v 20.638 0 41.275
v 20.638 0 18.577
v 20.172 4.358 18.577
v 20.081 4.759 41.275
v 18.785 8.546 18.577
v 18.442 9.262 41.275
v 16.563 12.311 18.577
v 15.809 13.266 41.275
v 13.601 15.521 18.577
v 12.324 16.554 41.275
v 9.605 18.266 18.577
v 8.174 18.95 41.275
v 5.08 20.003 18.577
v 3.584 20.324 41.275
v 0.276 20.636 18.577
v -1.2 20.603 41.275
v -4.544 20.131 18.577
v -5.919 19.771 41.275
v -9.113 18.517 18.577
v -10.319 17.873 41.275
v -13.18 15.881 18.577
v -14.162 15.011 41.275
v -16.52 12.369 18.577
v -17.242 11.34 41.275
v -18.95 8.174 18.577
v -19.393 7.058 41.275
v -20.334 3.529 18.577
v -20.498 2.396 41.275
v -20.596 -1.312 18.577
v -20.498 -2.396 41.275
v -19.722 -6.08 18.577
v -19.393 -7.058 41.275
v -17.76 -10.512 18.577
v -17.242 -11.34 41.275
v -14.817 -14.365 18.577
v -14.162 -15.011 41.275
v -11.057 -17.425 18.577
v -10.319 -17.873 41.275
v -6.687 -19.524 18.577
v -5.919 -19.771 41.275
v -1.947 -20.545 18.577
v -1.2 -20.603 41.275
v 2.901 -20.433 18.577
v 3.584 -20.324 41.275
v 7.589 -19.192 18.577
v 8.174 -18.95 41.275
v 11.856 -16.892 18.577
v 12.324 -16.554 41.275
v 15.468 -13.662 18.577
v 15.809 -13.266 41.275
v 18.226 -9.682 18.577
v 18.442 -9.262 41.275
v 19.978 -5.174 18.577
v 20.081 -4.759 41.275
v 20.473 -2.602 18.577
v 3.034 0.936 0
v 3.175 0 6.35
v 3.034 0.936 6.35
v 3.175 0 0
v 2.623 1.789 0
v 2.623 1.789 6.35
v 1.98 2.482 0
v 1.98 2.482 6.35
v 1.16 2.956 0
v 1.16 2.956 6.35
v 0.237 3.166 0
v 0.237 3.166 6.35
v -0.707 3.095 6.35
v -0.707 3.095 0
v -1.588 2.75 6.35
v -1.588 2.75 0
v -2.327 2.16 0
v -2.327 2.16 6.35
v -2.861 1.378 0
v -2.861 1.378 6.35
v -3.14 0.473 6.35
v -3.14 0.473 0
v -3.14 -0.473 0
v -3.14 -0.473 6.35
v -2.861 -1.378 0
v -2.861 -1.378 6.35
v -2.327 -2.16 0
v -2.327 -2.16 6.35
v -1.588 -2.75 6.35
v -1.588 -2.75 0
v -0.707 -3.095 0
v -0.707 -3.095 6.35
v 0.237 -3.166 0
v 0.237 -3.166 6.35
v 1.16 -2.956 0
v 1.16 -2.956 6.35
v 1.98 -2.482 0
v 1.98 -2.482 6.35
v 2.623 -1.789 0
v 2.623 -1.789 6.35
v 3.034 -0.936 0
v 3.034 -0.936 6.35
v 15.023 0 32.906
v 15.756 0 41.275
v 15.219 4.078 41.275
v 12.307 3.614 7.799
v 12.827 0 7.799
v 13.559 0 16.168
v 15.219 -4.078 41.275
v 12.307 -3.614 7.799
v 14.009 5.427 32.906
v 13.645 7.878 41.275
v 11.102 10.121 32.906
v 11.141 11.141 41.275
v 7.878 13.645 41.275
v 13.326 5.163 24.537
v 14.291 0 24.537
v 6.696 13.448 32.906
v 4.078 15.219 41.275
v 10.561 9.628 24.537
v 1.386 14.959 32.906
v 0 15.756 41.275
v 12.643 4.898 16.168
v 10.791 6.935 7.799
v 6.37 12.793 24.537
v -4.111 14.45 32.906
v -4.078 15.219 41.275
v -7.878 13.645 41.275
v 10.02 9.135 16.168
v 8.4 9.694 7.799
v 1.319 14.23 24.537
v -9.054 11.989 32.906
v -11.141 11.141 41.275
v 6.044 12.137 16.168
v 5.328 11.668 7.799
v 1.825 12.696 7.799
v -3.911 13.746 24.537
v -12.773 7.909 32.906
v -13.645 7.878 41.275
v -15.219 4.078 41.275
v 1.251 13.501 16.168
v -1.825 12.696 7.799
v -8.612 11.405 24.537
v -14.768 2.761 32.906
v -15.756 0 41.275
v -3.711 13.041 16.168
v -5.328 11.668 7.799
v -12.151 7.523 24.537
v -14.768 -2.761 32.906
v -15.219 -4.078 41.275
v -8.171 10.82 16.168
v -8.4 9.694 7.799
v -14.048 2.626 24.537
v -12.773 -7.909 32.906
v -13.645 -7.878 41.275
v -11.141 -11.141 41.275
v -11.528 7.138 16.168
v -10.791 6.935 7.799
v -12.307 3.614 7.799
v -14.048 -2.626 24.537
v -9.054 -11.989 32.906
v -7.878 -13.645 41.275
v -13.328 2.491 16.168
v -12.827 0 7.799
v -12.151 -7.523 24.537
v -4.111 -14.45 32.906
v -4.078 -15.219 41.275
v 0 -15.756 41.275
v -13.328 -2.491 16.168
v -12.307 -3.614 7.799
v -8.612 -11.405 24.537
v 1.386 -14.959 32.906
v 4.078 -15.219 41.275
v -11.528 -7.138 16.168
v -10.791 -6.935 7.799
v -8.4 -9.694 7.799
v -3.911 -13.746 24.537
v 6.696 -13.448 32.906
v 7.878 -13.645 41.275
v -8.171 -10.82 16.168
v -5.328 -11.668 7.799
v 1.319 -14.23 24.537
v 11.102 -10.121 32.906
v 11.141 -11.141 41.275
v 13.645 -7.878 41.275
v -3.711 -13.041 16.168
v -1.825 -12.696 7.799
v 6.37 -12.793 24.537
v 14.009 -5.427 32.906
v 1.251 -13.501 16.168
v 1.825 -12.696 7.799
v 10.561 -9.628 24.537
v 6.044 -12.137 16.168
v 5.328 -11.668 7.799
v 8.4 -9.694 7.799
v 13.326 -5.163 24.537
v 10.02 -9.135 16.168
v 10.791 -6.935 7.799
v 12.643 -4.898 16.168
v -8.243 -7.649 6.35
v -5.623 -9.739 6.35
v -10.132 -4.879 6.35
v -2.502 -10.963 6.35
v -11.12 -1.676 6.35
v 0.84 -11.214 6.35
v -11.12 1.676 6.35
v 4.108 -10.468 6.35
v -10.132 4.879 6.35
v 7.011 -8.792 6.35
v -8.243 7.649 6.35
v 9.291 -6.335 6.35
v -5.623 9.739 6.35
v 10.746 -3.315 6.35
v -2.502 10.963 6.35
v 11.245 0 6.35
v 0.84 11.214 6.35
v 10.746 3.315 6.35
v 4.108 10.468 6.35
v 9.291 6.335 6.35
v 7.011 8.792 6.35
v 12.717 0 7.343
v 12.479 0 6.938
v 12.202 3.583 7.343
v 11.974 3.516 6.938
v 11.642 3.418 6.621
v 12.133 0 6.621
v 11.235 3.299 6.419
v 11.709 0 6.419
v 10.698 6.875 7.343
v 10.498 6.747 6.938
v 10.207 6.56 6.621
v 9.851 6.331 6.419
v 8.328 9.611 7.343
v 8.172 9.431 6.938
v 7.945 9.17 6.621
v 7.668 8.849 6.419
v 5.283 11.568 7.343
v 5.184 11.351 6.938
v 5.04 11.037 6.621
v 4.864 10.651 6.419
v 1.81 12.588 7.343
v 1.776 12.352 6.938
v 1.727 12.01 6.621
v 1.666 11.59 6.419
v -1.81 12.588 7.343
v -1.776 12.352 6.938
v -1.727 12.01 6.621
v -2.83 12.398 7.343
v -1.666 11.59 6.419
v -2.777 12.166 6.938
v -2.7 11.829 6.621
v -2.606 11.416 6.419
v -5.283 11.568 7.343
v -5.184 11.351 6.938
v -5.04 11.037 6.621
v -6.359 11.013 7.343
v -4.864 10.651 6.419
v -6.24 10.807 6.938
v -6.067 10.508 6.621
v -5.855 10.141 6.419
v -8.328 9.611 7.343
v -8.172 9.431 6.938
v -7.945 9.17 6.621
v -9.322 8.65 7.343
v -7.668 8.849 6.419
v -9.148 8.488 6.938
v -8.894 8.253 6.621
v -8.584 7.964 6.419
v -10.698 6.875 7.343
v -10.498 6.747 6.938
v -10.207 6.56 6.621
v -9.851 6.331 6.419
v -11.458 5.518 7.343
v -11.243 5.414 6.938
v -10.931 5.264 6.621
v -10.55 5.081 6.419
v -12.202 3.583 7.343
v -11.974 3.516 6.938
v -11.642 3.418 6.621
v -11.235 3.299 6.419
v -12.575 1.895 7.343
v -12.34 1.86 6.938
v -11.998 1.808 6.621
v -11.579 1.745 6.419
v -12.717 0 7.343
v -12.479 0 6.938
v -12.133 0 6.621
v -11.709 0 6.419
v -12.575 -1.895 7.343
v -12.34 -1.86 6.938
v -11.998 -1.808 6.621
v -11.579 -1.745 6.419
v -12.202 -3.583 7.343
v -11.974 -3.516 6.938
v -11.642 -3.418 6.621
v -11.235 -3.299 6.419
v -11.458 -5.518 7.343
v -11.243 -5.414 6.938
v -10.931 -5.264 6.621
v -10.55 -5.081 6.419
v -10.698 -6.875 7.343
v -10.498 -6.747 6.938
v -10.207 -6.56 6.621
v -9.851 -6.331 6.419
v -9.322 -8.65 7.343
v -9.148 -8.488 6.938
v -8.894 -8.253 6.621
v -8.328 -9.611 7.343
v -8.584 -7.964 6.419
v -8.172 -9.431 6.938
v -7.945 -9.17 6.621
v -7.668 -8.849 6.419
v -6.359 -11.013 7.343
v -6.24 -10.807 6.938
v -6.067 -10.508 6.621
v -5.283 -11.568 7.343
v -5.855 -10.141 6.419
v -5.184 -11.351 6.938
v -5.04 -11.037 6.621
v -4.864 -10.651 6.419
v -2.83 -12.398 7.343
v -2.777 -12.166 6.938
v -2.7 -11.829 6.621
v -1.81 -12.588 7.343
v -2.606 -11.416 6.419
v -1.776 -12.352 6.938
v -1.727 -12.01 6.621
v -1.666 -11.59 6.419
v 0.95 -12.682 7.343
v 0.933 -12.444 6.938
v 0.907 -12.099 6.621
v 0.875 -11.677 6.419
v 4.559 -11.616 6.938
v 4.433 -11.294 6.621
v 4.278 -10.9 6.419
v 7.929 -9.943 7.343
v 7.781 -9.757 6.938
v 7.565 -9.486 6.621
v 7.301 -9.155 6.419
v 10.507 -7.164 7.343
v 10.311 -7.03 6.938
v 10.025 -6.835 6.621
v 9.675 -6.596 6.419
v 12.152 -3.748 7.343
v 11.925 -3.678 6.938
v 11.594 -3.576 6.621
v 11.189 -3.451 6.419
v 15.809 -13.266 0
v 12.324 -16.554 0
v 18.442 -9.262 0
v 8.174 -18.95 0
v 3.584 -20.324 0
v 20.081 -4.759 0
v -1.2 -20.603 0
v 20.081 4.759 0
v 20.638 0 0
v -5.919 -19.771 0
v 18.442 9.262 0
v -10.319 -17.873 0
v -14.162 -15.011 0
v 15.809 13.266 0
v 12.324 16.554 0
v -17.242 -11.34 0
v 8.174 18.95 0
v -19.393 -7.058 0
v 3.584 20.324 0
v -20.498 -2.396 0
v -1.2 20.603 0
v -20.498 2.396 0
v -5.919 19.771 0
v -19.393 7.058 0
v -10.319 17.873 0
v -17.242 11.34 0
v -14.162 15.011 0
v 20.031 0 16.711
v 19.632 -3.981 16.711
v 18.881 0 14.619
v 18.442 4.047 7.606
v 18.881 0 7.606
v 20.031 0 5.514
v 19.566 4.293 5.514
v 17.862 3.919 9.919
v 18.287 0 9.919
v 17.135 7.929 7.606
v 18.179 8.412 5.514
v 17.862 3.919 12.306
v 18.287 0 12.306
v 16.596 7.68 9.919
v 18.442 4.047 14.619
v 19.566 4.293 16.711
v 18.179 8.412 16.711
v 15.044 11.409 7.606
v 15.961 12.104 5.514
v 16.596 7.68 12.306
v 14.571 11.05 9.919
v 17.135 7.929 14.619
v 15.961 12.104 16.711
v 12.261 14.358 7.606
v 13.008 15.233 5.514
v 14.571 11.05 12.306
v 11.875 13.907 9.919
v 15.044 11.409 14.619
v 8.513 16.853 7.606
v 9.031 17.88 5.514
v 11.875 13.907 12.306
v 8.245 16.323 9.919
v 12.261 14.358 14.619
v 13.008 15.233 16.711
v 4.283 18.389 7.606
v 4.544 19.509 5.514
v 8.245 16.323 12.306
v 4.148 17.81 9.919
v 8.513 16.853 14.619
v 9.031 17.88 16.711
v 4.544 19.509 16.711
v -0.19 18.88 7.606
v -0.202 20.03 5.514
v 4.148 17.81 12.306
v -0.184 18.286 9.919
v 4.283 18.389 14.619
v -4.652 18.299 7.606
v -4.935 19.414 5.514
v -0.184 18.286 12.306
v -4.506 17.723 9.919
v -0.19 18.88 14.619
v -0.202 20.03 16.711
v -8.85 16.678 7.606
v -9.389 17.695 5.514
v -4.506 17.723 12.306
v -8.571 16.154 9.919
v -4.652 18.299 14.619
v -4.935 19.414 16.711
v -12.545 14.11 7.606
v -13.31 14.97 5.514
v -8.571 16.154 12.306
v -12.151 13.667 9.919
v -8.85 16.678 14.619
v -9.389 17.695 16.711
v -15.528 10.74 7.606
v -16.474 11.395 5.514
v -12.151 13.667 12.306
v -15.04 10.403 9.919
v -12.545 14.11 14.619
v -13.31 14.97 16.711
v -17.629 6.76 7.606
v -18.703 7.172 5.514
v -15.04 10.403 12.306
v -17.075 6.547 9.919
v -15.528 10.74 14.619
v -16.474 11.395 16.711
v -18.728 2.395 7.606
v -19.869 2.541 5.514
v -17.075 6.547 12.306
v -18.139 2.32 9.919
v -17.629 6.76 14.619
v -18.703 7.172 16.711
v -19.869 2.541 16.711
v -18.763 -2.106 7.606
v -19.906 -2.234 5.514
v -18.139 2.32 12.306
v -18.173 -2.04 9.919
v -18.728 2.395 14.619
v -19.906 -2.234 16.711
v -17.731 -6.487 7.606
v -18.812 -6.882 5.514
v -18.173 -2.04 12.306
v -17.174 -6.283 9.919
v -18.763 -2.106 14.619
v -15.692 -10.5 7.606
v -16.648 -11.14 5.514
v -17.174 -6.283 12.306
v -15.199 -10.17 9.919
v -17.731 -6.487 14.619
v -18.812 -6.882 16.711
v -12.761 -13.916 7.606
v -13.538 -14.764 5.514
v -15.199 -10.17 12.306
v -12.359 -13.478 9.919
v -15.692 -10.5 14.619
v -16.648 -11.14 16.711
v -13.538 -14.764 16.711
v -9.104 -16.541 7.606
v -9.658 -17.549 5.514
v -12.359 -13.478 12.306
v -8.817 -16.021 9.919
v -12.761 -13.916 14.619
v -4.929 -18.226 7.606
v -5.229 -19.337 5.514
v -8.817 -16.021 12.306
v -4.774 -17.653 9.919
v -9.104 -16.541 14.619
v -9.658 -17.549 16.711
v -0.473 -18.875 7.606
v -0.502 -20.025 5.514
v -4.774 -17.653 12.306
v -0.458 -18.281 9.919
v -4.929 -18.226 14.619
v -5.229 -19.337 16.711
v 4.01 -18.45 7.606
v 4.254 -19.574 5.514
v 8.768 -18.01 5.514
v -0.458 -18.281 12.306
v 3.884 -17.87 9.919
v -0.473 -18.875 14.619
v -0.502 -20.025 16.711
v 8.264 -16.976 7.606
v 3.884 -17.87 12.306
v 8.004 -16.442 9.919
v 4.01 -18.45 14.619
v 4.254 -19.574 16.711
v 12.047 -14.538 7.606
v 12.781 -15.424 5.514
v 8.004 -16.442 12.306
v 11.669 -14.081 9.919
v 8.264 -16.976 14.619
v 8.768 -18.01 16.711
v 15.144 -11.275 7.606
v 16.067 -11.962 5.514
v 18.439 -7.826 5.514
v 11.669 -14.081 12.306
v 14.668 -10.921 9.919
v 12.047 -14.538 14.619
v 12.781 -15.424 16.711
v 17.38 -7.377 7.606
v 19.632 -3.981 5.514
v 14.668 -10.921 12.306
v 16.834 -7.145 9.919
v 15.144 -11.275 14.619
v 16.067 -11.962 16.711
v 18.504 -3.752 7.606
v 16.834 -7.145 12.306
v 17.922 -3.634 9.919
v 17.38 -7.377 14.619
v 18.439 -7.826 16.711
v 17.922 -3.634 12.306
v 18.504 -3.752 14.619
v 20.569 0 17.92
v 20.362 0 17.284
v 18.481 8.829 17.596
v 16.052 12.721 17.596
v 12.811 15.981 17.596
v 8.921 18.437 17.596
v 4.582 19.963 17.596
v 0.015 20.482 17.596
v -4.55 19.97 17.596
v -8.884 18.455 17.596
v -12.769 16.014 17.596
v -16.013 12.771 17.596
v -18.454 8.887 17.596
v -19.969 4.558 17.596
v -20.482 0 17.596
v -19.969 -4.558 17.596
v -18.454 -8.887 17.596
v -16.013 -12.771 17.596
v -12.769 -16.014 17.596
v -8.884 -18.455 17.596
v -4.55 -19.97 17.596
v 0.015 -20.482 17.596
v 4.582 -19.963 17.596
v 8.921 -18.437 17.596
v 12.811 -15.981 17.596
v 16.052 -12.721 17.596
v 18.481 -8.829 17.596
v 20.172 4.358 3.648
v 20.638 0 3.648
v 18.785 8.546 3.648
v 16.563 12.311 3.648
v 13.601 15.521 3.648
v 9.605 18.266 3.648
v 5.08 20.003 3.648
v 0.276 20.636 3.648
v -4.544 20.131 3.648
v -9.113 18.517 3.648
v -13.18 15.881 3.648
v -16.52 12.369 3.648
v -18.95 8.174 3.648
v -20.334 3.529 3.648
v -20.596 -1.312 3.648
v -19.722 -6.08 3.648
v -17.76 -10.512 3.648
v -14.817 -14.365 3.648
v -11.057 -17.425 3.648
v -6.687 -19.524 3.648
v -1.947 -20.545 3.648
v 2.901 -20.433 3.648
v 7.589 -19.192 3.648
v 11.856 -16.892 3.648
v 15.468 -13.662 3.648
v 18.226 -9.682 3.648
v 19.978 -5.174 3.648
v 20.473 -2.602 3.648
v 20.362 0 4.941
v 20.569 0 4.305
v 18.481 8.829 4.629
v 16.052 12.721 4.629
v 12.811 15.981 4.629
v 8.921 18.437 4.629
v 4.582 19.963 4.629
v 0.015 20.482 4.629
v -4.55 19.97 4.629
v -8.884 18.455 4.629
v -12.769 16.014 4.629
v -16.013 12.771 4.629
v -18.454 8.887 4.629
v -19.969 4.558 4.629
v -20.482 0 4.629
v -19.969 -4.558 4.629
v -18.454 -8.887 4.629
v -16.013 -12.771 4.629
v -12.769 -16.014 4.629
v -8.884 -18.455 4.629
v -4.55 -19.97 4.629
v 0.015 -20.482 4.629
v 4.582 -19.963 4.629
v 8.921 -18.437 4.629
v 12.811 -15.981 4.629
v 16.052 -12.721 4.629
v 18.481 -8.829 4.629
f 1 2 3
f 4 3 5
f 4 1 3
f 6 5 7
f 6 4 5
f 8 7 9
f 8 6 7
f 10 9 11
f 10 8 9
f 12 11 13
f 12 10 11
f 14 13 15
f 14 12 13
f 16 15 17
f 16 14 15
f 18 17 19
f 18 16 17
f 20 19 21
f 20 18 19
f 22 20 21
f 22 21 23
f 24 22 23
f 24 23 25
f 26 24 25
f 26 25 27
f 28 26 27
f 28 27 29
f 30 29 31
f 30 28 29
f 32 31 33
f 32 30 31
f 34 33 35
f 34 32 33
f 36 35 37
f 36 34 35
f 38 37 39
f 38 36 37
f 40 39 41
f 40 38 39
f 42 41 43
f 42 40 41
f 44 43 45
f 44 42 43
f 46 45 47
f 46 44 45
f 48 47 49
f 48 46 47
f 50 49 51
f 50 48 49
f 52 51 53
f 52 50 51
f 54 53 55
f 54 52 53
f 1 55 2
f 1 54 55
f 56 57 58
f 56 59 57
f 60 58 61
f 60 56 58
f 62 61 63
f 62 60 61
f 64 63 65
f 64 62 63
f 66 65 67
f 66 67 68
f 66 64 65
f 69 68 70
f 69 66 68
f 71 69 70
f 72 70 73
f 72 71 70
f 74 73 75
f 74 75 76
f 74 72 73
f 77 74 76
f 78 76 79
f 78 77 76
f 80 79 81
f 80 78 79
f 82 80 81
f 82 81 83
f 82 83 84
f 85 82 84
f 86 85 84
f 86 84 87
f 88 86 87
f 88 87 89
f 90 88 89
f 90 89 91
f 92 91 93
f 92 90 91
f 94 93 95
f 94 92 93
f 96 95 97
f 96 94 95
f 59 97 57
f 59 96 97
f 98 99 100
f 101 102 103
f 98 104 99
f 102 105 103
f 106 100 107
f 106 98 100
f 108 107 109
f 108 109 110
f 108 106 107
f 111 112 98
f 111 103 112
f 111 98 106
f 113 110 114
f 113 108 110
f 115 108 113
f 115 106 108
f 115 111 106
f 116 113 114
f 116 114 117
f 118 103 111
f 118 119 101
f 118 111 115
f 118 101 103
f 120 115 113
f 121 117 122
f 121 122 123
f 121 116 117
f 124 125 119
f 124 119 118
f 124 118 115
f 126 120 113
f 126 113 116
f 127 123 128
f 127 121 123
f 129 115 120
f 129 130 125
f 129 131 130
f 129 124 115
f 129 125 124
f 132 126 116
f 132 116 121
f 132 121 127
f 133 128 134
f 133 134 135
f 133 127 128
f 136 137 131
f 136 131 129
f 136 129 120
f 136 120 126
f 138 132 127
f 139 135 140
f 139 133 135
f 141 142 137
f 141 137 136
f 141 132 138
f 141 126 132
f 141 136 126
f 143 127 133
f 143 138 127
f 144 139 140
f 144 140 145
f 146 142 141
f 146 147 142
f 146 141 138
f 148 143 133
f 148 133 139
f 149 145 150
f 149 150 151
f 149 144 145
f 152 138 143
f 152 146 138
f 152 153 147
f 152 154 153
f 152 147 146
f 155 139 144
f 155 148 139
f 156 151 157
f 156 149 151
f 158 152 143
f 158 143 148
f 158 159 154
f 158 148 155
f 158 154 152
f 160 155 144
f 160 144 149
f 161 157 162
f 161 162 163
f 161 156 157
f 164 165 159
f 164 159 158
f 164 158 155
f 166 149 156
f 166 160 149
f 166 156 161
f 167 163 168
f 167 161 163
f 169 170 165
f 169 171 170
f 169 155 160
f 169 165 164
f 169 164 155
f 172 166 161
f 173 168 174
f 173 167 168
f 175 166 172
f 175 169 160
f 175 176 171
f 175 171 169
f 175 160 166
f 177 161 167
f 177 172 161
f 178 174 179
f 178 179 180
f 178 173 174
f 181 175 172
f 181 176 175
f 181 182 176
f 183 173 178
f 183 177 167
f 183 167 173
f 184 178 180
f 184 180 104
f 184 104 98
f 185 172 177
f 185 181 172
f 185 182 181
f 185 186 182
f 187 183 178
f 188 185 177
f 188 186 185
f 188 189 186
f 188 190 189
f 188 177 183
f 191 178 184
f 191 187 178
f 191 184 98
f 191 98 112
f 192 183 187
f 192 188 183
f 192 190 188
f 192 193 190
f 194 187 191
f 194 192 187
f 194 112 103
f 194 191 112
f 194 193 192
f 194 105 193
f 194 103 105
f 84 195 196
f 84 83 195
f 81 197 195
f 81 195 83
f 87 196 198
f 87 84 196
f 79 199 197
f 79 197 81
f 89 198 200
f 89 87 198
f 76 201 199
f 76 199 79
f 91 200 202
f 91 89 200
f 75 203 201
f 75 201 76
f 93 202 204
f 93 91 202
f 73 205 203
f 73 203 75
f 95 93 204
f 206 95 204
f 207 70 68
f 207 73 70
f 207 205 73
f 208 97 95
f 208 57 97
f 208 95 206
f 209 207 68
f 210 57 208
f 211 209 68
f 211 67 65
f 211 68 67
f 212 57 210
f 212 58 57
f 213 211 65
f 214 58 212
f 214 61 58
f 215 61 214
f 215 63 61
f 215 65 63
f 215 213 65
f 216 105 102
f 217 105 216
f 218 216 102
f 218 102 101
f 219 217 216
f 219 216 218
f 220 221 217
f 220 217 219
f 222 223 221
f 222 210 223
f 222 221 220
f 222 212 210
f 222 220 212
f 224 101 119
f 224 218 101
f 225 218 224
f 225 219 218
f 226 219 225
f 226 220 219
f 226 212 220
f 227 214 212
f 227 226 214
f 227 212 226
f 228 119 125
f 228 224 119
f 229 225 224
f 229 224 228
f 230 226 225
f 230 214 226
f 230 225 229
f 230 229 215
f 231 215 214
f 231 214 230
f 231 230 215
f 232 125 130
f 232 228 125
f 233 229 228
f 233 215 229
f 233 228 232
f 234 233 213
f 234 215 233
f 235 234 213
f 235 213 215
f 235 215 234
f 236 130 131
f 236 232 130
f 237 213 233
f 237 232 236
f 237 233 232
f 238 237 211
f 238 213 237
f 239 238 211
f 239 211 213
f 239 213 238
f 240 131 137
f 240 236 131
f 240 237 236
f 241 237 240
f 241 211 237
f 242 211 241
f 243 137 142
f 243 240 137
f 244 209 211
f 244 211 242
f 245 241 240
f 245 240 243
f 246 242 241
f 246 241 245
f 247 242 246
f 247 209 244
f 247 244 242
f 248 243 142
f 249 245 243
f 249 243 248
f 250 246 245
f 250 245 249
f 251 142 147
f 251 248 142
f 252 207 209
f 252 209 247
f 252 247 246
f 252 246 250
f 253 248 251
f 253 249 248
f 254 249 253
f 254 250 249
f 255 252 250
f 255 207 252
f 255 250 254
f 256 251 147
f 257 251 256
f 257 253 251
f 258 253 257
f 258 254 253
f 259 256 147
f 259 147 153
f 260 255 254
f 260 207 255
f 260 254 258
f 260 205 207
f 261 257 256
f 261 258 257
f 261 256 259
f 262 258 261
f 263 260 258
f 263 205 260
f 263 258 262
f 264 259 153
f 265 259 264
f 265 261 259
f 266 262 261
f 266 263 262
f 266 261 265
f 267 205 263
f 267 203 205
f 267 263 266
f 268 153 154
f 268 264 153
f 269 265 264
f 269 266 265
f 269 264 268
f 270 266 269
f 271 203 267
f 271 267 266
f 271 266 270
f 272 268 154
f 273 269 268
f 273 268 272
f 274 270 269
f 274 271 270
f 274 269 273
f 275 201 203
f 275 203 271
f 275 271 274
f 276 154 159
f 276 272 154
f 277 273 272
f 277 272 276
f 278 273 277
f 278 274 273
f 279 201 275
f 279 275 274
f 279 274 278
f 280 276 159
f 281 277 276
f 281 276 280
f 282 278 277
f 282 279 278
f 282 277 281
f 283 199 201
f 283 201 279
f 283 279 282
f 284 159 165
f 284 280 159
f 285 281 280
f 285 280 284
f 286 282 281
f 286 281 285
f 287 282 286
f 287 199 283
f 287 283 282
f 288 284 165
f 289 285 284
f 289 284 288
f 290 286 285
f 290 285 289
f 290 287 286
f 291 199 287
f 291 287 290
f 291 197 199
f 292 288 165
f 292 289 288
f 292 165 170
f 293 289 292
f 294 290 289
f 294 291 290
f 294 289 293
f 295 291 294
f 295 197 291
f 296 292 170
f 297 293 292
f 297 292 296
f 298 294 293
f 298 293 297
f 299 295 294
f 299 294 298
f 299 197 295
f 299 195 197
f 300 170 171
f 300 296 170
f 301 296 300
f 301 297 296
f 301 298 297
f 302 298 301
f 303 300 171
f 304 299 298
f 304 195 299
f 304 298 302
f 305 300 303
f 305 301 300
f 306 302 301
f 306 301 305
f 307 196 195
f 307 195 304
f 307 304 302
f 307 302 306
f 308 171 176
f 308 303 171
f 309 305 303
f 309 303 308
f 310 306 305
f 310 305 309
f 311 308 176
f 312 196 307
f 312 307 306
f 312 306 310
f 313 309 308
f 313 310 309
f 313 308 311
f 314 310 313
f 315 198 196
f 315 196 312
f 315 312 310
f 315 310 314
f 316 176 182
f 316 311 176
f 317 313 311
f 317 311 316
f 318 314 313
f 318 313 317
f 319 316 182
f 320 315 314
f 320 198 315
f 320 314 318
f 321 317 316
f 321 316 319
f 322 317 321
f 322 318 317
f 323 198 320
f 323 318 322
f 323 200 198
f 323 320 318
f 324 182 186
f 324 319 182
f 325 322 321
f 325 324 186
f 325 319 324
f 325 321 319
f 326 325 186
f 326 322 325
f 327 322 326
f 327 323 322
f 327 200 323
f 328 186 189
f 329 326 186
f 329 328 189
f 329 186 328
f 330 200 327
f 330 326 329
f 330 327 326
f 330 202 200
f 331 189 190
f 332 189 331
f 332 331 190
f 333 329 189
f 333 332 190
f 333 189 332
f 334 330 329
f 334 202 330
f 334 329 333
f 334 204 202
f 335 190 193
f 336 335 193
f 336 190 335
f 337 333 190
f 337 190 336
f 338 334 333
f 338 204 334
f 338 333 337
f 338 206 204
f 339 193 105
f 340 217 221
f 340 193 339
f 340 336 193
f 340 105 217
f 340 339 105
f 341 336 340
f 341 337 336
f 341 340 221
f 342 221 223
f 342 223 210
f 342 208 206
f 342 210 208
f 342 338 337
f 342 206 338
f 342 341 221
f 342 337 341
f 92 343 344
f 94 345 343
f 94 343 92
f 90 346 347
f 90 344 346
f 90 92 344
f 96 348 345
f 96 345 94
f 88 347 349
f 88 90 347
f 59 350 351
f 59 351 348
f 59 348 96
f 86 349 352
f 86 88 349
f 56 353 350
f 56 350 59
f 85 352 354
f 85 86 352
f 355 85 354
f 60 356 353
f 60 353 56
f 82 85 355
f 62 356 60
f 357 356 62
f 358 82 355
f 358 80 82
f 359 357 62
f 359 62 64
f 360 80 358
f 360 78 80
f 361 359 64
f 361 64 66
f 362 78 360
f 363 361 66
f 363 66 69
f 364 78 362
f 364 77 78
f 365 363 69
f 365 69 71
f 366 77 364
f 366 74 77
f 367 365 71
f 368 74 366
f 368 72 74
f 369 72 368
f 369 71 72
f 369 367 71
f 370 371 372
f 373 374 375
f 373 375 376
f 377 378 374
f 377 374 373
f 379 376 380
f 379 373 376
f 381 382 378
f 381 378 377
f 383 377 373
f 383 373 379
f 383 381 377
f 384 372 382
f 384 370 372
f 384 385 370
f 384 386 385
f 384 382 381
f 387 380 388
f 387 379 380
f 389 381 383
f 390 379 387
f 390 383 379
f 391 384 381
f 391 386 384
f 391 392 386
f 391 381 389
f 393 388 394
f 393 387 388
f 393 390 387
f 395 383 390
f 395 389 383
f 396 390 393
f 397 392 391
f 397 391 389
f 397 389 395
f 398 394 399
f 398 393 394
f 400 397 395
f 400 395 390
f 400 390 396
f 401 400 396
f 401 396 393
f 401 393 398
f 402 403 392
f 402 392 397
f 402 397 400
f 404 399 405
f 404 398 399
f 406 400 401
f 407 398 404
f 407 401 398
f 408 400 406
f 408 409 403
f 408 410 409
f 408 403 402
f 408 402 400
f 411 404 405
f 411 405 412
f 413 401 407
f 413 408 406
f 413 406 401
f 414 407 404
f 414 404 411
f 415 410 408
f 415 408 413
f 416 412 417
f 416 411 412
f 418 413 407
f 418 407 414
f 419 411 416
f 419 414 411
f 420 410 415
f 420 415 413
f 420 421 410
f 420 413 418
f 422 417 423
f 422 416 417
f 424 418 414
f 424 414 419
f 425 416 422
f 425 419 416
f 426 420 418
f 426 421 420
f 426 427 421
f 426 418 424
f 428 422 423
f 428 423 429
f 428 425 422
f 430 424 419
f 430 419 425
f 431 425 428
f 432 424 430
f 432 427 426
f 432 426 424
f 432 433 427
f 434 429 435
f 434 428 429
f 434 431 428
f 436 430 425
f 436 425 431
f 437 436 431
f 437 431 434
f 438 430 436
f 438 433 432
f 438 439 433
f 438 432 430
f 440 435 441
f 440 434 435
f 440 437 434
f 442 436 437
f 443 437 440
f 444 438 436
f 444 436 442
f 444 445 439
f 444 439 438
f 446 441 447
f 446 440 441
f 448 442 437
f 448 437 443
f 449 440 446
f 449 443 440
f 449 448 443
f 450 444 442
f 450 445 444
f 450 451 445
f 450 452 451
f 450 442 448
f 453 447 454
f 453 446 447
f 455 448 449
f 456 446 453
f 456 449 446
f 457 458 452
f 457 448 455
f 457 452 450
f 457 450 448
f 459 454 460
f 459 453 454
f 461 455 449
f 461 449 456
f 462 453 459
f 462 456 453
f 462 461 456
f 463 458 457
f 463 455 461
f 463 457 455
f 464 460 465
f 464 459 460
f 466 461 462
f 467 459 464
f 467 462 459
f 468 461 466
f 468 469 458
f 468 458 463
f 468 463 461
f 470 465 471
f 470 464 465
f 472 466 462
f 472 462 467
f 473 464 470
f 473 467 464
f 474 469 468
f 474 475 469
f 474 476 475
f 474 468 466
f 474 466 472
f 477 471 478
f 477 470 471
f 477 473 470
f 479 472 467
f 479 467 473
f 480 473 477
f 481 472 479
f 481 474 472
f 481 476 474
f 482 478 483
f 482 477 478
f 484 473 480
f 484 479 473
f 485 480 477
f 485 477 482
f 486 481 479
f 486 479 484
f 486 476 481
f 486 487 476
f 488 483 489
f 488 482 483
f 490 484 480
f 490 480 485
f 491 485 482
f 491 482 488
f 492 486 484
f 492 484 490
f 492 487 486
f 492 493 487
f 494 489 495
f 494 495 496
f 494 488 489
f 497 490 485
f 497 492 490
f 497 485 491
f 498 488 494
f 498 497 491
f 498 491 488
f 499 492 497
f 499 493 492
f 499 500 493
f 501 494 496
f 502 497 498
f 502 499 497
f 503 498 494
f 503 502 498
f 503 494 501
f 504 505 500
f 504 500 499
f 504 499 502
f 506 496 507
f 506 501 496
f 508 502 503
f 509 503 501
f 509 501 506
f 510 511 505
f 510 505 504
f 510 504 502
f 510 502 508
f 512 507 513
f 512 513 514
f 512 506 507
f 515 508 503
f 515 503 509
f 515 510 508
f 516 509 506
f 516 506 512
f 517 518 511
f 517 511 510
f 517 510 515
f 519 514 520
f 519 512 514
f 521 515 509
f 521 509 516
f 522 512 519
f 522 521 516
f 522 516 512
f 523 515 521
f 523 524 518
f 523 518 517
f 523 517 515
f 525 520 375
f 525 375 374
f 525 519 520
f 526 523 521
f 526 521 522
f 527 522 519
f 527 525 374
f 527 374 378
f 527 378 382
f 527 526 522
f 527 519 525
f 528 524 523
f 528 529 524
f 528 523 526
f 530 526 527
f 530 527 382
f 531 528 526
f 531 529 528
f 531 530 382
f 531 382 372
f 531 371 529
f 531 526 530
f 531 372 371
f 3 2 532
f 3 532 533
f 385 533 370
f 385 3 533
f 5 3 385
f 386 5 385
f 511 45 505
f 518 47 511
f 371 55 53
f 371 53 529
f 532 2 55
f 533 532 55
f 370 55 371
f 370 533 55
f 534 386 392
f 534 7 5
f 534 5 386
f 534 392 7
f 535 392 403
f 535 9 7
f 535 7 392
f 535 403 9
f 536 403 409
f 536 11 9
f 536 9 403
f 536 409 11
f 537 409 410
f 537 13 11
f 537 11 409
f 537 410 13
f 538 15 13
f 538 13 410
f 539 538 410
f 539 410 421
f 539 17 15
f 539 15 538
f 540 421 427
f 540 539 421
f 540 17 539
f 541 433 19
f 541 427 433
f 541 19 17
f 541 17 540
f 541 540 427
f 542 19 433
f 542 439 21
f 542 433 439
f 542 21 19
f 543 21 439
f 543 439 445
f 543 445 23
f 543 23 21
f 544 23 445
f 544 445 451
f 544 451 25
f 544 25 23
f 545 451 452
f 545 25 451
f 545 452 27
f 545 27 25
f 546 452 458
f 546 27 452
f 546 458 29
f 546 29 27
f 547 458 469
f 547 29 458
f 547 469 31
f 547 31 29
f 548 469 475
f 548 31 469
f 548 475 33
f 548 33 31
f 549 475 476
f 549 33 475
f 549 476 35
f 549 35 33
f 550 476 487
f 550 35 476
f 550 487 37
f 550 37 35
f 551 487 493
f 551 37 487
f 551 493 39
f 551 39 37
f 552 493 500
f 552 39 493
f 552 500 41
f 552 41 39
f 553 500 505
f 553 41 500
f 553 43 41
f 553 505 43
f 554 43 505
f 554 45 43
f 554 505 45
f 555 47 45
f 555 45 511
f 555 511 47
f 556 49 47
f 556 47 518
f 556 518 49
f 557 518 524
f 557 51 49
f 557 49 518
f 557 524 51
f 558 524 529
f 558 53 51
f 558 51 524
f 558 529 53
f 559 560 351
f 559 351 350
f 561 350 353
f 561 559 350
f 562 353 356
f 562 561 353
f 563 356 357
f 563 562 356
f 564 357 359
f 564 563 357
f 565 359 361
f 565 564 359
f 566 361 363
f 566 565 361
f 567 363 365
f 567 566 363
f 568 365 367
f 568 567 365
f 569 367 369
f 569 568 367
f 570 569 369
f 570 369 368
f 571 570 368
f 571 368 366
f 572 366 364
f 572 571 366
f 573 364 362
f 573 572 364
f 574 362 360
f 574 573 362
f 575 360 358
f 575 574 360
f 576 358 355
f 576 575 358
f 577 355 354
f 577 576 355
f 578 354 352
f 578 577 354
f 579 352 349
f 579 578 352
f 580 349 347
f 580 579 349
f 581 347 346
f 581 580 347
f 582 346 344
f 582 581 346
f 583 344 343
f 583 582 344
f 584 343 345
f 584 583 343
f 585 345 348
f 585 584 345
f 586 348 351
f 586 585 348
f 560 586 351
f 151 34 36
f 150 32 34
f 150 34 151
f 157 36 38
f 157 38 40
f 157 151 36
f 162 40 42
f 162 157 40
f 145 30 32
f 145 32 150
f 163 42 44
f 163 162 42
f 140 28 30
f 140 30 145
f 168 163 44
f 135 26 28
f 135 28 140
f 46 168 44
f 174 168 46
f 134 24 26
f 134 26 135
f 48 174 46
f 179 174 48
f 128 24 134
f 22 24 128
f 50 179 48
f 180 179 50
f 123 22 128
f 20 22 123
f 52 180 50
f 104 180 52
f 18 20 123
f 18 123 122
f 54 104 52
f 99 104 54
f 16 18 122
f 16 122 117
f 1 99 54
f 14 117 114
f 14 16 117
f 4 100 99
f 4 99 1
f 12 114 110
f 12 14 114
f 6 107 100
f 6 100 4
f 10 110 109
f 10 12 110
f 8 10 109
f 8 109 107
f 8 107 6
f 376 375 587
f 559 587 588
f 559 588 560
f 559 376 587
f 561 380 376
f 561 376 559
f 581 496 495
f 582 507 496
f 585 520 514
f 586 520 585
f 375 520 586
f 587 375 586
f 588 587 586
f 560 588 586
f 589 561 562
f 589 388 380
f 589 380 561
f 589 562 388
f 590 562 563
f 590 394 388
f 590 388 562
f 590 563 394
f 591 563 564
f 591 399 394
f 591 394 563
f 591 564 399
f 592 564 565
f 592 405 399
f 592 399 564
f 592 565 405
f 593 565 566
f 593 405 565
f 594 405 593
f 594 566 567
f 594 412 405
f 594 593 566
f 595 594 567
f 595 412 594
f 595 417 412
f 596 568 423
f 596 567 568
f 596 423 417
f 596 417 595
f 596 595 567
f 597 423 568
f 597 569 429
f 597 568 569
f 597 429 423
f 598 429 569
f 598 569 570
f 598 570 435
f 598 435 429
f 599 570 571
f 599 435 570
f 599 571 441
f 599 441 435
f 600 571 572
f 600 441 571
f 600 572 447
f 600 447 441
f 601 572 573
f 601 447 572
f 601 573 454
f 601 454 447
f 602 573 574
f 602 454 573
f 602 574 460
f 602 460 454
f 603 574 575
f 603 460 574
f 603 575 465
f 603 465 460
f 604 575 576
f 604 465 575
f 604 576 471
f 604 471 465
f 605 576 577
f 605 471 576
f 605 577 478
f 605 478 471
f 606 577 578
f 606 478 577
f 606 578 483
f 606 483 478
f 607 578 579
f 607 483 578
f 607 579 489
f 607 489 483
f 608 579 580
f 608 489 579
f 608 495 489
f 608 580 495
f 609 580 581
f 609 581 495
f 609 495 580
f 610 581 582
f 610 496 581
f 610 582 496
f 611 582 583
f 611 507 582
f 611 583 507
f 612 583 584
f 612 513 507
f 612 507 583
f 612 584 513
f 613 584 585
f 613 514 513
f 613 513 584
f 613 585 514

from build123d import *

# Parameters (mm, degrees)
F2_R = 1.5875
F3_R = 3.175


with BuildPart() as f1:
    # F0 (on Front) → F1 (revolve)
    with BuildSketch(Plane.XZ):
        with BuildLine():
            Line((3.175, 6.35), (3.175, 0))
            Line((3.175, 0), (20.6375, 0))
            Line((20.6375, 0), (20.6375, 4.7625))
            ThreePointArc((20.6375, 4.7625), (18.212016, 11.1125), (20.6375, 17.4625))
            Line((20.6375, 17.4625), (20.6375, 41.275))
            Line((20.6375, 41.275), (15.755542, 41.275))
            Line((15.755542, 41.275), (12.7, 6.35))
            Line((12.7, 6.35), (3.175, 6.35))
        make_face()
    revolve(axis=Axis((0, 0, 42.399504), (0, 0, 1)))

    # F2
    f2_edges = [f1.edges().sort_by_distance(p)[0] for p in [
        (-12.7, 0, 6.35),
    ]]
    fillet(f2_edges, radius=F2_R)

    # F3
    f3_edges = [f1.edges().sort_by_distance(p)[0] for p in [
        (-20.6375, 0, 17.4625),
        (-20.6375, 0, 4.7625),
    ]]
    fillet(f3_edges, radius=F3_R)


solid = f1.part
